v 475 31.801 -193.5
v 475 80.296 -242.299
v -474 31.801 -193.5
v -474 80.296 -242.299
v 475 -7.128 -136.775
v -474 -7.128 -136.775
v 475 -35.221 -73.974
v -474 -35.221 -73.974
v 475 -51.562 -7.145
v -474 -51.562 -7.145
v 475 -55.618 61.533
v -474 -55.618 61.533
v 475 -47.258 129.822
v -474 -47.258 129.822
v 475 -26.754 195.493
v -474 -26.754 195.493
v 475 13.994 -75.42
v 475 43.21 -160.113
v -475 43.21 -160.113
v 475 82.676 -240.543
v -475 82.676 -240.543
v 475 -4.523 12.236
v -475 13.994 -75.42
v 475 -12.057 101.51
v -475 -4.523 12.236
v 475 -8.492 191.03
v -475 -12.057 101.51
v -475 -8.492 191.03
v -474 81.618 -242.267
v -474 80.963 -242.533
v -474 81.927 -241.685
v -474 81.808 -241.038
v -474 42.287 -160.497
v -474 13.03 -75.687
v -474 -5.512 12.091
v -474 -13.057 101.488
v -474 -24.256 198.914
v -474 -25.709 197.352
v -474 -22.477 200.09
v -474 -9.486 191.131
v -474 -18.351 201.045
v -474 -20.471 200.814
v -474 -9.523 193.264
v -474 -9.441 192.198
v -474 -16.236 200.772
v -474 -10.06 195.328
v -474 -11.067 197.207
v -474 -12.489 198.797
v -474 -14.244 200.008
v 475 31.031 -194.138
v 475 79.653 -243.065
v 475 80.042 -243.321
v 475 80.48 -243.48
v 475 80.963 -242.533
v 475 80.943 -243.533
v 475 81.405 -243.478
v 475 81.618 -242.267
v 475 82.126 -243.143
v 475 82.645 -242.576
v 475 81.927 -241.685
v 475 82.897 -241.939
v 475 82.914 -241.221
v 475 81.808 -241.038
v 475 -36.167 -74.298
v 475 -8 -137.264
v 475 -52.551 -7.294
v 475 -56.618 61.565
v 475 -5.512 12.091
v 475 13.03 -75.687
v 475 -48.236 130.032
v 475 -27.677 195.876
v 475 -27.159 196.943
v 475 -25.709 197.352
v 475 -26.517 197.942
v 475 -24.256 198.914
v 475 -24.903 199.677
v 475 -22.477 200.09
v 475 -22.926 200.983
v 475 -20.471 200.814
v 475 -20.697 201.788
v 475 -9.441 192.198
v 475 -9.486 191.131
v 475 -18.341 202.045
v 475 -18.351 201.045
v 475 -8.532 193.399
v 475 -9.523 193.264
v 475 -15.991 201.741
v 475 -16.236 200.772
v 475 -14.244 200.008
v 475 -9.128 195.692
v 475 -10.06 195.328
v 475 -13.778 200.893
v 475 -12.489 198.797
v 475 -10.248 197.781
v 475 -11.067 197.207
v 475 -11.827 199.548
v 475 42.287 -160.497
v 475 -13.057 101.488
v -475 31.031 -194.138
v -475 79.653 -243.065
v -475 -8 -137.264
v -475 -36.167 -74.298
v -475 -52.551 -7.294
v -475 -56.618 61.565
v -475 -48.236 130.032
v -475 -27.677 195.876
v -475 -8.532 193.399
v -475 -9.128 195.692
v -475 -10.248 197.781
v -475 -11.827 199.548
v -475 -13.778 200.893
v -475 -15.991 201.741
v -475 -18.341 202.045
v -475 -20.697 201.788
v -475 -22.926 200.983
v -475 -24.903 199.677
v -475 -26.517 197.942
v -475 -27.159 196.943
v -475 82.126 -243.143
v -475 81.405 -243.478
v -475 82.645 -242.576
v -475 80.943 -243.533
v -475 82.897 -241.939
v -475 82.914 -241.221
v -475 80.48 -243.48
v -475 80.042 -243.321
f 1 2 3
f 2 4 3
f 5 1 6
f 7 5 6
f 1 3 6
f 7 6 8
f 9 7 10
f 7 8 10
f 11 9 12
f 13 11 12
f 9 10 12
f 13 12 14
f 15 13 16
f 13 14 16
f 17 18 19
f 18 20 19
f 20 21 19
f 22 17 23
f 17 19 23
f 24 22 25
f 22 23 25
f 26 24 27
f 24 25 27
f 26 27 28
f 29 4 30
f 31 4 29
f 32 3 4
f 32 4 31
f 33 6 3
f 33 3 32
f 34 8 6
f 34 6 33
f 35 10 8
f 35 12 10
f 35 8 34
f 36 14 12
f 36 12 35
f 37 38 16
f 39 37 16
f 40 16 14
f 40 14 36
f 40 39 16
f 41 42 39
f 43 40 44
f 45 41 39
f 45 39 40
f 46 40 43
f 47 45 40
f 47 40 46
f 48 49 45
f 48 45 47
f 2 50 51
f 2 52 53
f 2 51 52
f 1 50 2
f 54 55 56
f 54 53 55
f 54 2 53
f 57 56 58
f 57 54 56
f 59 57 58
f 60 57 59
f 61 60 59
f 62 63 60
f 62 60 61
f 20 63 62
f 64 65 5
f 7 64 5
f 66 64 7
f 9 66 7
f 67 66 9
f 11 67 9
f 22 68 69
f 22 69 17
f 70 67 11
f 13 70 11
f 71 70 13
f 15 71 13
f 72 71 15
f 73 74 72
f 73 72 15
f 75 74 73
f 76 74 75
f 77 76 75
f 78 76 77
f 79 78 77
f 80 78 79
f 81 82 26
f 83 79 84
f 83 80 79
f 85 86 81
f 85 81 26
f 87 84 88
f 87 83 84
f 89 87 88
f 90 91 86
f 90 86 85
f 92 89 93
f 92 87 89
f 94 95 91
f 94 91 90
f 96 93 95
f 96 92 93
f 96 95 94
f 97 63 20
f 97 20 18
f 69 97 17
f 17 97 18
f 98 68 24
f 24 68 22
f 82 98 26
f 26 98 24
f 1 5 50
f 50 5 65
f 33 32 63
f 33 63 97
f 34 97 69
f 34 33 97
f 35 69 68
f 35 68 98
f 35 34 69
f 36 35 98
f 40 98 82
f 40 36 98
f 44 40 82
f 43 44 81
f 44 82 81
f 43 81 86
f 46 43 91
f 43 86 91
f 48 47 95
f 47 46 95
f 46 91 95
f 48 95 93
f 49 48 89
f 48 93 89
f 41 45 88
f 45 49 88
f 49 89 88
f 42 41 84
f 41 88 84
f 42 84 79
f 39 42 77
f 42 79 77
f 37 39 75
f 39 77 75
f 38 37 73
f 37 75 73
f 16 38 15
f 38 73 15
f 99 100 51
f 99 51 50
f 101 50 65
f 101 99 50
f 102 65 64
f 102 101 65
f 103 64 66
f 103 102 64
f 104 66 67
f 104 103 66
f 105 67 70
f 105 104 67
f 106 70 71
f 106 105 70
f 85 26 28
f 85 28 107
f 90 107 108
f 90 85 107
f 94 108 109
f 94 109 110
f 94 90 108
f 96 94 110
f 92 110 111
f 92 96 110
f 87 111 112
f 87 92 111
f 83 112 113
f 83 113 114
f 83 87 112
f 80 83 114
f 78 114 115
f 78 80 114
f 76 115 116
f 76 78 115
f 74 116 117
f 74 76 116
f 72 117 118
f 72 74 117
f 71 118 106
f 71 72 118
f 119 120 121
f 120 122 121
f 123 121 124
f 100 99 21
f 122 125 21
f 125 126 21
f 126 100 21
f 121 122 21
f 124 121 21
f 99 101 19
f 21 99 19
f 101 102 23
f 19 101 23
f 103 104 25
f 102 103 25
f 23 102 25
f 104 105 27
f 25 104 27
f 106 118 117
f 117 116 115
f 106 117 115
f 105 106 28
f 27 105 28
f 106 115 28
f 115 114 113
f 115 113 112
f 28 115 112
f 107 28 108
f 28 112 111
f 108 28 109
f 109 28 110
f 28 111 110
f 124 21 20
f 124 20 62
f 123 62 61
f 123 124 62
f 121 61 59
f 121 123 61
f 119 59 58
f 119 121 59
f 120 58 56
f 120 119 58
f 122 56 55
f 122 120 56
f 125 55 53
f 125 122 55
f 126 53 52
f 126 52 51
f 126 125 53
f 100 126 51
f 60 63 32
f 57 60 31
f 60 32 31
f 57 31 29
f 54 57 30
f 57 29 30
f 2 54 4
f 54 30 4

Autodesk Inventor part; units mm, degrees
ref_plane "YZ Plane" through (0, 0, 0) normal (1, 0, 0) x (0, 1, 0)
ref_plane "XZ Plane" through (0, 0, 0) normal (0, 1, 0) x (-1, 0, 0)
ref_plane "XY Plane" through (0, 0, 0) normal (0, 0, 1) x (1, 0, 0)
sketch "スケッチ1" plane through (0, 0, 0) normal (1, 0, 0) x (0, 1, 0)
  line L0 (0, 250) -> (88.1635, -250)
  line L1 (0, 353.3532) -> (0, -370.1192) projected
  arc A0 (0, 250) -> (88.1635, -250) centre (710.7652, 117.5543) ccw
  arc A1 (0, 250) -> (88.1635, -250) centre (325.1936, 49.5676) ccw
  point P0 (0, 0)
  dimension "d0" = 10
  dimension "d1" = 500
  dimension "d2" = 723
  dimension "d3" = 382
  dimension "d4" = 250
extrude "押し出し1" add sketch "スケッチ1" along normal mid plane 950 contours A0 L1 A1 | A1 L1 A0
fillet "フィレット1" radius 10 1 edges at (0, 0, 250)
fillet "フィレット2" radius 2 1 edges at (0, 88.1635, -250)
shell "シェル1" thickness 1 removed faces 1 at (475, -17.1174, -13.9662)
properties part number "cover_re" material "CFRP"
